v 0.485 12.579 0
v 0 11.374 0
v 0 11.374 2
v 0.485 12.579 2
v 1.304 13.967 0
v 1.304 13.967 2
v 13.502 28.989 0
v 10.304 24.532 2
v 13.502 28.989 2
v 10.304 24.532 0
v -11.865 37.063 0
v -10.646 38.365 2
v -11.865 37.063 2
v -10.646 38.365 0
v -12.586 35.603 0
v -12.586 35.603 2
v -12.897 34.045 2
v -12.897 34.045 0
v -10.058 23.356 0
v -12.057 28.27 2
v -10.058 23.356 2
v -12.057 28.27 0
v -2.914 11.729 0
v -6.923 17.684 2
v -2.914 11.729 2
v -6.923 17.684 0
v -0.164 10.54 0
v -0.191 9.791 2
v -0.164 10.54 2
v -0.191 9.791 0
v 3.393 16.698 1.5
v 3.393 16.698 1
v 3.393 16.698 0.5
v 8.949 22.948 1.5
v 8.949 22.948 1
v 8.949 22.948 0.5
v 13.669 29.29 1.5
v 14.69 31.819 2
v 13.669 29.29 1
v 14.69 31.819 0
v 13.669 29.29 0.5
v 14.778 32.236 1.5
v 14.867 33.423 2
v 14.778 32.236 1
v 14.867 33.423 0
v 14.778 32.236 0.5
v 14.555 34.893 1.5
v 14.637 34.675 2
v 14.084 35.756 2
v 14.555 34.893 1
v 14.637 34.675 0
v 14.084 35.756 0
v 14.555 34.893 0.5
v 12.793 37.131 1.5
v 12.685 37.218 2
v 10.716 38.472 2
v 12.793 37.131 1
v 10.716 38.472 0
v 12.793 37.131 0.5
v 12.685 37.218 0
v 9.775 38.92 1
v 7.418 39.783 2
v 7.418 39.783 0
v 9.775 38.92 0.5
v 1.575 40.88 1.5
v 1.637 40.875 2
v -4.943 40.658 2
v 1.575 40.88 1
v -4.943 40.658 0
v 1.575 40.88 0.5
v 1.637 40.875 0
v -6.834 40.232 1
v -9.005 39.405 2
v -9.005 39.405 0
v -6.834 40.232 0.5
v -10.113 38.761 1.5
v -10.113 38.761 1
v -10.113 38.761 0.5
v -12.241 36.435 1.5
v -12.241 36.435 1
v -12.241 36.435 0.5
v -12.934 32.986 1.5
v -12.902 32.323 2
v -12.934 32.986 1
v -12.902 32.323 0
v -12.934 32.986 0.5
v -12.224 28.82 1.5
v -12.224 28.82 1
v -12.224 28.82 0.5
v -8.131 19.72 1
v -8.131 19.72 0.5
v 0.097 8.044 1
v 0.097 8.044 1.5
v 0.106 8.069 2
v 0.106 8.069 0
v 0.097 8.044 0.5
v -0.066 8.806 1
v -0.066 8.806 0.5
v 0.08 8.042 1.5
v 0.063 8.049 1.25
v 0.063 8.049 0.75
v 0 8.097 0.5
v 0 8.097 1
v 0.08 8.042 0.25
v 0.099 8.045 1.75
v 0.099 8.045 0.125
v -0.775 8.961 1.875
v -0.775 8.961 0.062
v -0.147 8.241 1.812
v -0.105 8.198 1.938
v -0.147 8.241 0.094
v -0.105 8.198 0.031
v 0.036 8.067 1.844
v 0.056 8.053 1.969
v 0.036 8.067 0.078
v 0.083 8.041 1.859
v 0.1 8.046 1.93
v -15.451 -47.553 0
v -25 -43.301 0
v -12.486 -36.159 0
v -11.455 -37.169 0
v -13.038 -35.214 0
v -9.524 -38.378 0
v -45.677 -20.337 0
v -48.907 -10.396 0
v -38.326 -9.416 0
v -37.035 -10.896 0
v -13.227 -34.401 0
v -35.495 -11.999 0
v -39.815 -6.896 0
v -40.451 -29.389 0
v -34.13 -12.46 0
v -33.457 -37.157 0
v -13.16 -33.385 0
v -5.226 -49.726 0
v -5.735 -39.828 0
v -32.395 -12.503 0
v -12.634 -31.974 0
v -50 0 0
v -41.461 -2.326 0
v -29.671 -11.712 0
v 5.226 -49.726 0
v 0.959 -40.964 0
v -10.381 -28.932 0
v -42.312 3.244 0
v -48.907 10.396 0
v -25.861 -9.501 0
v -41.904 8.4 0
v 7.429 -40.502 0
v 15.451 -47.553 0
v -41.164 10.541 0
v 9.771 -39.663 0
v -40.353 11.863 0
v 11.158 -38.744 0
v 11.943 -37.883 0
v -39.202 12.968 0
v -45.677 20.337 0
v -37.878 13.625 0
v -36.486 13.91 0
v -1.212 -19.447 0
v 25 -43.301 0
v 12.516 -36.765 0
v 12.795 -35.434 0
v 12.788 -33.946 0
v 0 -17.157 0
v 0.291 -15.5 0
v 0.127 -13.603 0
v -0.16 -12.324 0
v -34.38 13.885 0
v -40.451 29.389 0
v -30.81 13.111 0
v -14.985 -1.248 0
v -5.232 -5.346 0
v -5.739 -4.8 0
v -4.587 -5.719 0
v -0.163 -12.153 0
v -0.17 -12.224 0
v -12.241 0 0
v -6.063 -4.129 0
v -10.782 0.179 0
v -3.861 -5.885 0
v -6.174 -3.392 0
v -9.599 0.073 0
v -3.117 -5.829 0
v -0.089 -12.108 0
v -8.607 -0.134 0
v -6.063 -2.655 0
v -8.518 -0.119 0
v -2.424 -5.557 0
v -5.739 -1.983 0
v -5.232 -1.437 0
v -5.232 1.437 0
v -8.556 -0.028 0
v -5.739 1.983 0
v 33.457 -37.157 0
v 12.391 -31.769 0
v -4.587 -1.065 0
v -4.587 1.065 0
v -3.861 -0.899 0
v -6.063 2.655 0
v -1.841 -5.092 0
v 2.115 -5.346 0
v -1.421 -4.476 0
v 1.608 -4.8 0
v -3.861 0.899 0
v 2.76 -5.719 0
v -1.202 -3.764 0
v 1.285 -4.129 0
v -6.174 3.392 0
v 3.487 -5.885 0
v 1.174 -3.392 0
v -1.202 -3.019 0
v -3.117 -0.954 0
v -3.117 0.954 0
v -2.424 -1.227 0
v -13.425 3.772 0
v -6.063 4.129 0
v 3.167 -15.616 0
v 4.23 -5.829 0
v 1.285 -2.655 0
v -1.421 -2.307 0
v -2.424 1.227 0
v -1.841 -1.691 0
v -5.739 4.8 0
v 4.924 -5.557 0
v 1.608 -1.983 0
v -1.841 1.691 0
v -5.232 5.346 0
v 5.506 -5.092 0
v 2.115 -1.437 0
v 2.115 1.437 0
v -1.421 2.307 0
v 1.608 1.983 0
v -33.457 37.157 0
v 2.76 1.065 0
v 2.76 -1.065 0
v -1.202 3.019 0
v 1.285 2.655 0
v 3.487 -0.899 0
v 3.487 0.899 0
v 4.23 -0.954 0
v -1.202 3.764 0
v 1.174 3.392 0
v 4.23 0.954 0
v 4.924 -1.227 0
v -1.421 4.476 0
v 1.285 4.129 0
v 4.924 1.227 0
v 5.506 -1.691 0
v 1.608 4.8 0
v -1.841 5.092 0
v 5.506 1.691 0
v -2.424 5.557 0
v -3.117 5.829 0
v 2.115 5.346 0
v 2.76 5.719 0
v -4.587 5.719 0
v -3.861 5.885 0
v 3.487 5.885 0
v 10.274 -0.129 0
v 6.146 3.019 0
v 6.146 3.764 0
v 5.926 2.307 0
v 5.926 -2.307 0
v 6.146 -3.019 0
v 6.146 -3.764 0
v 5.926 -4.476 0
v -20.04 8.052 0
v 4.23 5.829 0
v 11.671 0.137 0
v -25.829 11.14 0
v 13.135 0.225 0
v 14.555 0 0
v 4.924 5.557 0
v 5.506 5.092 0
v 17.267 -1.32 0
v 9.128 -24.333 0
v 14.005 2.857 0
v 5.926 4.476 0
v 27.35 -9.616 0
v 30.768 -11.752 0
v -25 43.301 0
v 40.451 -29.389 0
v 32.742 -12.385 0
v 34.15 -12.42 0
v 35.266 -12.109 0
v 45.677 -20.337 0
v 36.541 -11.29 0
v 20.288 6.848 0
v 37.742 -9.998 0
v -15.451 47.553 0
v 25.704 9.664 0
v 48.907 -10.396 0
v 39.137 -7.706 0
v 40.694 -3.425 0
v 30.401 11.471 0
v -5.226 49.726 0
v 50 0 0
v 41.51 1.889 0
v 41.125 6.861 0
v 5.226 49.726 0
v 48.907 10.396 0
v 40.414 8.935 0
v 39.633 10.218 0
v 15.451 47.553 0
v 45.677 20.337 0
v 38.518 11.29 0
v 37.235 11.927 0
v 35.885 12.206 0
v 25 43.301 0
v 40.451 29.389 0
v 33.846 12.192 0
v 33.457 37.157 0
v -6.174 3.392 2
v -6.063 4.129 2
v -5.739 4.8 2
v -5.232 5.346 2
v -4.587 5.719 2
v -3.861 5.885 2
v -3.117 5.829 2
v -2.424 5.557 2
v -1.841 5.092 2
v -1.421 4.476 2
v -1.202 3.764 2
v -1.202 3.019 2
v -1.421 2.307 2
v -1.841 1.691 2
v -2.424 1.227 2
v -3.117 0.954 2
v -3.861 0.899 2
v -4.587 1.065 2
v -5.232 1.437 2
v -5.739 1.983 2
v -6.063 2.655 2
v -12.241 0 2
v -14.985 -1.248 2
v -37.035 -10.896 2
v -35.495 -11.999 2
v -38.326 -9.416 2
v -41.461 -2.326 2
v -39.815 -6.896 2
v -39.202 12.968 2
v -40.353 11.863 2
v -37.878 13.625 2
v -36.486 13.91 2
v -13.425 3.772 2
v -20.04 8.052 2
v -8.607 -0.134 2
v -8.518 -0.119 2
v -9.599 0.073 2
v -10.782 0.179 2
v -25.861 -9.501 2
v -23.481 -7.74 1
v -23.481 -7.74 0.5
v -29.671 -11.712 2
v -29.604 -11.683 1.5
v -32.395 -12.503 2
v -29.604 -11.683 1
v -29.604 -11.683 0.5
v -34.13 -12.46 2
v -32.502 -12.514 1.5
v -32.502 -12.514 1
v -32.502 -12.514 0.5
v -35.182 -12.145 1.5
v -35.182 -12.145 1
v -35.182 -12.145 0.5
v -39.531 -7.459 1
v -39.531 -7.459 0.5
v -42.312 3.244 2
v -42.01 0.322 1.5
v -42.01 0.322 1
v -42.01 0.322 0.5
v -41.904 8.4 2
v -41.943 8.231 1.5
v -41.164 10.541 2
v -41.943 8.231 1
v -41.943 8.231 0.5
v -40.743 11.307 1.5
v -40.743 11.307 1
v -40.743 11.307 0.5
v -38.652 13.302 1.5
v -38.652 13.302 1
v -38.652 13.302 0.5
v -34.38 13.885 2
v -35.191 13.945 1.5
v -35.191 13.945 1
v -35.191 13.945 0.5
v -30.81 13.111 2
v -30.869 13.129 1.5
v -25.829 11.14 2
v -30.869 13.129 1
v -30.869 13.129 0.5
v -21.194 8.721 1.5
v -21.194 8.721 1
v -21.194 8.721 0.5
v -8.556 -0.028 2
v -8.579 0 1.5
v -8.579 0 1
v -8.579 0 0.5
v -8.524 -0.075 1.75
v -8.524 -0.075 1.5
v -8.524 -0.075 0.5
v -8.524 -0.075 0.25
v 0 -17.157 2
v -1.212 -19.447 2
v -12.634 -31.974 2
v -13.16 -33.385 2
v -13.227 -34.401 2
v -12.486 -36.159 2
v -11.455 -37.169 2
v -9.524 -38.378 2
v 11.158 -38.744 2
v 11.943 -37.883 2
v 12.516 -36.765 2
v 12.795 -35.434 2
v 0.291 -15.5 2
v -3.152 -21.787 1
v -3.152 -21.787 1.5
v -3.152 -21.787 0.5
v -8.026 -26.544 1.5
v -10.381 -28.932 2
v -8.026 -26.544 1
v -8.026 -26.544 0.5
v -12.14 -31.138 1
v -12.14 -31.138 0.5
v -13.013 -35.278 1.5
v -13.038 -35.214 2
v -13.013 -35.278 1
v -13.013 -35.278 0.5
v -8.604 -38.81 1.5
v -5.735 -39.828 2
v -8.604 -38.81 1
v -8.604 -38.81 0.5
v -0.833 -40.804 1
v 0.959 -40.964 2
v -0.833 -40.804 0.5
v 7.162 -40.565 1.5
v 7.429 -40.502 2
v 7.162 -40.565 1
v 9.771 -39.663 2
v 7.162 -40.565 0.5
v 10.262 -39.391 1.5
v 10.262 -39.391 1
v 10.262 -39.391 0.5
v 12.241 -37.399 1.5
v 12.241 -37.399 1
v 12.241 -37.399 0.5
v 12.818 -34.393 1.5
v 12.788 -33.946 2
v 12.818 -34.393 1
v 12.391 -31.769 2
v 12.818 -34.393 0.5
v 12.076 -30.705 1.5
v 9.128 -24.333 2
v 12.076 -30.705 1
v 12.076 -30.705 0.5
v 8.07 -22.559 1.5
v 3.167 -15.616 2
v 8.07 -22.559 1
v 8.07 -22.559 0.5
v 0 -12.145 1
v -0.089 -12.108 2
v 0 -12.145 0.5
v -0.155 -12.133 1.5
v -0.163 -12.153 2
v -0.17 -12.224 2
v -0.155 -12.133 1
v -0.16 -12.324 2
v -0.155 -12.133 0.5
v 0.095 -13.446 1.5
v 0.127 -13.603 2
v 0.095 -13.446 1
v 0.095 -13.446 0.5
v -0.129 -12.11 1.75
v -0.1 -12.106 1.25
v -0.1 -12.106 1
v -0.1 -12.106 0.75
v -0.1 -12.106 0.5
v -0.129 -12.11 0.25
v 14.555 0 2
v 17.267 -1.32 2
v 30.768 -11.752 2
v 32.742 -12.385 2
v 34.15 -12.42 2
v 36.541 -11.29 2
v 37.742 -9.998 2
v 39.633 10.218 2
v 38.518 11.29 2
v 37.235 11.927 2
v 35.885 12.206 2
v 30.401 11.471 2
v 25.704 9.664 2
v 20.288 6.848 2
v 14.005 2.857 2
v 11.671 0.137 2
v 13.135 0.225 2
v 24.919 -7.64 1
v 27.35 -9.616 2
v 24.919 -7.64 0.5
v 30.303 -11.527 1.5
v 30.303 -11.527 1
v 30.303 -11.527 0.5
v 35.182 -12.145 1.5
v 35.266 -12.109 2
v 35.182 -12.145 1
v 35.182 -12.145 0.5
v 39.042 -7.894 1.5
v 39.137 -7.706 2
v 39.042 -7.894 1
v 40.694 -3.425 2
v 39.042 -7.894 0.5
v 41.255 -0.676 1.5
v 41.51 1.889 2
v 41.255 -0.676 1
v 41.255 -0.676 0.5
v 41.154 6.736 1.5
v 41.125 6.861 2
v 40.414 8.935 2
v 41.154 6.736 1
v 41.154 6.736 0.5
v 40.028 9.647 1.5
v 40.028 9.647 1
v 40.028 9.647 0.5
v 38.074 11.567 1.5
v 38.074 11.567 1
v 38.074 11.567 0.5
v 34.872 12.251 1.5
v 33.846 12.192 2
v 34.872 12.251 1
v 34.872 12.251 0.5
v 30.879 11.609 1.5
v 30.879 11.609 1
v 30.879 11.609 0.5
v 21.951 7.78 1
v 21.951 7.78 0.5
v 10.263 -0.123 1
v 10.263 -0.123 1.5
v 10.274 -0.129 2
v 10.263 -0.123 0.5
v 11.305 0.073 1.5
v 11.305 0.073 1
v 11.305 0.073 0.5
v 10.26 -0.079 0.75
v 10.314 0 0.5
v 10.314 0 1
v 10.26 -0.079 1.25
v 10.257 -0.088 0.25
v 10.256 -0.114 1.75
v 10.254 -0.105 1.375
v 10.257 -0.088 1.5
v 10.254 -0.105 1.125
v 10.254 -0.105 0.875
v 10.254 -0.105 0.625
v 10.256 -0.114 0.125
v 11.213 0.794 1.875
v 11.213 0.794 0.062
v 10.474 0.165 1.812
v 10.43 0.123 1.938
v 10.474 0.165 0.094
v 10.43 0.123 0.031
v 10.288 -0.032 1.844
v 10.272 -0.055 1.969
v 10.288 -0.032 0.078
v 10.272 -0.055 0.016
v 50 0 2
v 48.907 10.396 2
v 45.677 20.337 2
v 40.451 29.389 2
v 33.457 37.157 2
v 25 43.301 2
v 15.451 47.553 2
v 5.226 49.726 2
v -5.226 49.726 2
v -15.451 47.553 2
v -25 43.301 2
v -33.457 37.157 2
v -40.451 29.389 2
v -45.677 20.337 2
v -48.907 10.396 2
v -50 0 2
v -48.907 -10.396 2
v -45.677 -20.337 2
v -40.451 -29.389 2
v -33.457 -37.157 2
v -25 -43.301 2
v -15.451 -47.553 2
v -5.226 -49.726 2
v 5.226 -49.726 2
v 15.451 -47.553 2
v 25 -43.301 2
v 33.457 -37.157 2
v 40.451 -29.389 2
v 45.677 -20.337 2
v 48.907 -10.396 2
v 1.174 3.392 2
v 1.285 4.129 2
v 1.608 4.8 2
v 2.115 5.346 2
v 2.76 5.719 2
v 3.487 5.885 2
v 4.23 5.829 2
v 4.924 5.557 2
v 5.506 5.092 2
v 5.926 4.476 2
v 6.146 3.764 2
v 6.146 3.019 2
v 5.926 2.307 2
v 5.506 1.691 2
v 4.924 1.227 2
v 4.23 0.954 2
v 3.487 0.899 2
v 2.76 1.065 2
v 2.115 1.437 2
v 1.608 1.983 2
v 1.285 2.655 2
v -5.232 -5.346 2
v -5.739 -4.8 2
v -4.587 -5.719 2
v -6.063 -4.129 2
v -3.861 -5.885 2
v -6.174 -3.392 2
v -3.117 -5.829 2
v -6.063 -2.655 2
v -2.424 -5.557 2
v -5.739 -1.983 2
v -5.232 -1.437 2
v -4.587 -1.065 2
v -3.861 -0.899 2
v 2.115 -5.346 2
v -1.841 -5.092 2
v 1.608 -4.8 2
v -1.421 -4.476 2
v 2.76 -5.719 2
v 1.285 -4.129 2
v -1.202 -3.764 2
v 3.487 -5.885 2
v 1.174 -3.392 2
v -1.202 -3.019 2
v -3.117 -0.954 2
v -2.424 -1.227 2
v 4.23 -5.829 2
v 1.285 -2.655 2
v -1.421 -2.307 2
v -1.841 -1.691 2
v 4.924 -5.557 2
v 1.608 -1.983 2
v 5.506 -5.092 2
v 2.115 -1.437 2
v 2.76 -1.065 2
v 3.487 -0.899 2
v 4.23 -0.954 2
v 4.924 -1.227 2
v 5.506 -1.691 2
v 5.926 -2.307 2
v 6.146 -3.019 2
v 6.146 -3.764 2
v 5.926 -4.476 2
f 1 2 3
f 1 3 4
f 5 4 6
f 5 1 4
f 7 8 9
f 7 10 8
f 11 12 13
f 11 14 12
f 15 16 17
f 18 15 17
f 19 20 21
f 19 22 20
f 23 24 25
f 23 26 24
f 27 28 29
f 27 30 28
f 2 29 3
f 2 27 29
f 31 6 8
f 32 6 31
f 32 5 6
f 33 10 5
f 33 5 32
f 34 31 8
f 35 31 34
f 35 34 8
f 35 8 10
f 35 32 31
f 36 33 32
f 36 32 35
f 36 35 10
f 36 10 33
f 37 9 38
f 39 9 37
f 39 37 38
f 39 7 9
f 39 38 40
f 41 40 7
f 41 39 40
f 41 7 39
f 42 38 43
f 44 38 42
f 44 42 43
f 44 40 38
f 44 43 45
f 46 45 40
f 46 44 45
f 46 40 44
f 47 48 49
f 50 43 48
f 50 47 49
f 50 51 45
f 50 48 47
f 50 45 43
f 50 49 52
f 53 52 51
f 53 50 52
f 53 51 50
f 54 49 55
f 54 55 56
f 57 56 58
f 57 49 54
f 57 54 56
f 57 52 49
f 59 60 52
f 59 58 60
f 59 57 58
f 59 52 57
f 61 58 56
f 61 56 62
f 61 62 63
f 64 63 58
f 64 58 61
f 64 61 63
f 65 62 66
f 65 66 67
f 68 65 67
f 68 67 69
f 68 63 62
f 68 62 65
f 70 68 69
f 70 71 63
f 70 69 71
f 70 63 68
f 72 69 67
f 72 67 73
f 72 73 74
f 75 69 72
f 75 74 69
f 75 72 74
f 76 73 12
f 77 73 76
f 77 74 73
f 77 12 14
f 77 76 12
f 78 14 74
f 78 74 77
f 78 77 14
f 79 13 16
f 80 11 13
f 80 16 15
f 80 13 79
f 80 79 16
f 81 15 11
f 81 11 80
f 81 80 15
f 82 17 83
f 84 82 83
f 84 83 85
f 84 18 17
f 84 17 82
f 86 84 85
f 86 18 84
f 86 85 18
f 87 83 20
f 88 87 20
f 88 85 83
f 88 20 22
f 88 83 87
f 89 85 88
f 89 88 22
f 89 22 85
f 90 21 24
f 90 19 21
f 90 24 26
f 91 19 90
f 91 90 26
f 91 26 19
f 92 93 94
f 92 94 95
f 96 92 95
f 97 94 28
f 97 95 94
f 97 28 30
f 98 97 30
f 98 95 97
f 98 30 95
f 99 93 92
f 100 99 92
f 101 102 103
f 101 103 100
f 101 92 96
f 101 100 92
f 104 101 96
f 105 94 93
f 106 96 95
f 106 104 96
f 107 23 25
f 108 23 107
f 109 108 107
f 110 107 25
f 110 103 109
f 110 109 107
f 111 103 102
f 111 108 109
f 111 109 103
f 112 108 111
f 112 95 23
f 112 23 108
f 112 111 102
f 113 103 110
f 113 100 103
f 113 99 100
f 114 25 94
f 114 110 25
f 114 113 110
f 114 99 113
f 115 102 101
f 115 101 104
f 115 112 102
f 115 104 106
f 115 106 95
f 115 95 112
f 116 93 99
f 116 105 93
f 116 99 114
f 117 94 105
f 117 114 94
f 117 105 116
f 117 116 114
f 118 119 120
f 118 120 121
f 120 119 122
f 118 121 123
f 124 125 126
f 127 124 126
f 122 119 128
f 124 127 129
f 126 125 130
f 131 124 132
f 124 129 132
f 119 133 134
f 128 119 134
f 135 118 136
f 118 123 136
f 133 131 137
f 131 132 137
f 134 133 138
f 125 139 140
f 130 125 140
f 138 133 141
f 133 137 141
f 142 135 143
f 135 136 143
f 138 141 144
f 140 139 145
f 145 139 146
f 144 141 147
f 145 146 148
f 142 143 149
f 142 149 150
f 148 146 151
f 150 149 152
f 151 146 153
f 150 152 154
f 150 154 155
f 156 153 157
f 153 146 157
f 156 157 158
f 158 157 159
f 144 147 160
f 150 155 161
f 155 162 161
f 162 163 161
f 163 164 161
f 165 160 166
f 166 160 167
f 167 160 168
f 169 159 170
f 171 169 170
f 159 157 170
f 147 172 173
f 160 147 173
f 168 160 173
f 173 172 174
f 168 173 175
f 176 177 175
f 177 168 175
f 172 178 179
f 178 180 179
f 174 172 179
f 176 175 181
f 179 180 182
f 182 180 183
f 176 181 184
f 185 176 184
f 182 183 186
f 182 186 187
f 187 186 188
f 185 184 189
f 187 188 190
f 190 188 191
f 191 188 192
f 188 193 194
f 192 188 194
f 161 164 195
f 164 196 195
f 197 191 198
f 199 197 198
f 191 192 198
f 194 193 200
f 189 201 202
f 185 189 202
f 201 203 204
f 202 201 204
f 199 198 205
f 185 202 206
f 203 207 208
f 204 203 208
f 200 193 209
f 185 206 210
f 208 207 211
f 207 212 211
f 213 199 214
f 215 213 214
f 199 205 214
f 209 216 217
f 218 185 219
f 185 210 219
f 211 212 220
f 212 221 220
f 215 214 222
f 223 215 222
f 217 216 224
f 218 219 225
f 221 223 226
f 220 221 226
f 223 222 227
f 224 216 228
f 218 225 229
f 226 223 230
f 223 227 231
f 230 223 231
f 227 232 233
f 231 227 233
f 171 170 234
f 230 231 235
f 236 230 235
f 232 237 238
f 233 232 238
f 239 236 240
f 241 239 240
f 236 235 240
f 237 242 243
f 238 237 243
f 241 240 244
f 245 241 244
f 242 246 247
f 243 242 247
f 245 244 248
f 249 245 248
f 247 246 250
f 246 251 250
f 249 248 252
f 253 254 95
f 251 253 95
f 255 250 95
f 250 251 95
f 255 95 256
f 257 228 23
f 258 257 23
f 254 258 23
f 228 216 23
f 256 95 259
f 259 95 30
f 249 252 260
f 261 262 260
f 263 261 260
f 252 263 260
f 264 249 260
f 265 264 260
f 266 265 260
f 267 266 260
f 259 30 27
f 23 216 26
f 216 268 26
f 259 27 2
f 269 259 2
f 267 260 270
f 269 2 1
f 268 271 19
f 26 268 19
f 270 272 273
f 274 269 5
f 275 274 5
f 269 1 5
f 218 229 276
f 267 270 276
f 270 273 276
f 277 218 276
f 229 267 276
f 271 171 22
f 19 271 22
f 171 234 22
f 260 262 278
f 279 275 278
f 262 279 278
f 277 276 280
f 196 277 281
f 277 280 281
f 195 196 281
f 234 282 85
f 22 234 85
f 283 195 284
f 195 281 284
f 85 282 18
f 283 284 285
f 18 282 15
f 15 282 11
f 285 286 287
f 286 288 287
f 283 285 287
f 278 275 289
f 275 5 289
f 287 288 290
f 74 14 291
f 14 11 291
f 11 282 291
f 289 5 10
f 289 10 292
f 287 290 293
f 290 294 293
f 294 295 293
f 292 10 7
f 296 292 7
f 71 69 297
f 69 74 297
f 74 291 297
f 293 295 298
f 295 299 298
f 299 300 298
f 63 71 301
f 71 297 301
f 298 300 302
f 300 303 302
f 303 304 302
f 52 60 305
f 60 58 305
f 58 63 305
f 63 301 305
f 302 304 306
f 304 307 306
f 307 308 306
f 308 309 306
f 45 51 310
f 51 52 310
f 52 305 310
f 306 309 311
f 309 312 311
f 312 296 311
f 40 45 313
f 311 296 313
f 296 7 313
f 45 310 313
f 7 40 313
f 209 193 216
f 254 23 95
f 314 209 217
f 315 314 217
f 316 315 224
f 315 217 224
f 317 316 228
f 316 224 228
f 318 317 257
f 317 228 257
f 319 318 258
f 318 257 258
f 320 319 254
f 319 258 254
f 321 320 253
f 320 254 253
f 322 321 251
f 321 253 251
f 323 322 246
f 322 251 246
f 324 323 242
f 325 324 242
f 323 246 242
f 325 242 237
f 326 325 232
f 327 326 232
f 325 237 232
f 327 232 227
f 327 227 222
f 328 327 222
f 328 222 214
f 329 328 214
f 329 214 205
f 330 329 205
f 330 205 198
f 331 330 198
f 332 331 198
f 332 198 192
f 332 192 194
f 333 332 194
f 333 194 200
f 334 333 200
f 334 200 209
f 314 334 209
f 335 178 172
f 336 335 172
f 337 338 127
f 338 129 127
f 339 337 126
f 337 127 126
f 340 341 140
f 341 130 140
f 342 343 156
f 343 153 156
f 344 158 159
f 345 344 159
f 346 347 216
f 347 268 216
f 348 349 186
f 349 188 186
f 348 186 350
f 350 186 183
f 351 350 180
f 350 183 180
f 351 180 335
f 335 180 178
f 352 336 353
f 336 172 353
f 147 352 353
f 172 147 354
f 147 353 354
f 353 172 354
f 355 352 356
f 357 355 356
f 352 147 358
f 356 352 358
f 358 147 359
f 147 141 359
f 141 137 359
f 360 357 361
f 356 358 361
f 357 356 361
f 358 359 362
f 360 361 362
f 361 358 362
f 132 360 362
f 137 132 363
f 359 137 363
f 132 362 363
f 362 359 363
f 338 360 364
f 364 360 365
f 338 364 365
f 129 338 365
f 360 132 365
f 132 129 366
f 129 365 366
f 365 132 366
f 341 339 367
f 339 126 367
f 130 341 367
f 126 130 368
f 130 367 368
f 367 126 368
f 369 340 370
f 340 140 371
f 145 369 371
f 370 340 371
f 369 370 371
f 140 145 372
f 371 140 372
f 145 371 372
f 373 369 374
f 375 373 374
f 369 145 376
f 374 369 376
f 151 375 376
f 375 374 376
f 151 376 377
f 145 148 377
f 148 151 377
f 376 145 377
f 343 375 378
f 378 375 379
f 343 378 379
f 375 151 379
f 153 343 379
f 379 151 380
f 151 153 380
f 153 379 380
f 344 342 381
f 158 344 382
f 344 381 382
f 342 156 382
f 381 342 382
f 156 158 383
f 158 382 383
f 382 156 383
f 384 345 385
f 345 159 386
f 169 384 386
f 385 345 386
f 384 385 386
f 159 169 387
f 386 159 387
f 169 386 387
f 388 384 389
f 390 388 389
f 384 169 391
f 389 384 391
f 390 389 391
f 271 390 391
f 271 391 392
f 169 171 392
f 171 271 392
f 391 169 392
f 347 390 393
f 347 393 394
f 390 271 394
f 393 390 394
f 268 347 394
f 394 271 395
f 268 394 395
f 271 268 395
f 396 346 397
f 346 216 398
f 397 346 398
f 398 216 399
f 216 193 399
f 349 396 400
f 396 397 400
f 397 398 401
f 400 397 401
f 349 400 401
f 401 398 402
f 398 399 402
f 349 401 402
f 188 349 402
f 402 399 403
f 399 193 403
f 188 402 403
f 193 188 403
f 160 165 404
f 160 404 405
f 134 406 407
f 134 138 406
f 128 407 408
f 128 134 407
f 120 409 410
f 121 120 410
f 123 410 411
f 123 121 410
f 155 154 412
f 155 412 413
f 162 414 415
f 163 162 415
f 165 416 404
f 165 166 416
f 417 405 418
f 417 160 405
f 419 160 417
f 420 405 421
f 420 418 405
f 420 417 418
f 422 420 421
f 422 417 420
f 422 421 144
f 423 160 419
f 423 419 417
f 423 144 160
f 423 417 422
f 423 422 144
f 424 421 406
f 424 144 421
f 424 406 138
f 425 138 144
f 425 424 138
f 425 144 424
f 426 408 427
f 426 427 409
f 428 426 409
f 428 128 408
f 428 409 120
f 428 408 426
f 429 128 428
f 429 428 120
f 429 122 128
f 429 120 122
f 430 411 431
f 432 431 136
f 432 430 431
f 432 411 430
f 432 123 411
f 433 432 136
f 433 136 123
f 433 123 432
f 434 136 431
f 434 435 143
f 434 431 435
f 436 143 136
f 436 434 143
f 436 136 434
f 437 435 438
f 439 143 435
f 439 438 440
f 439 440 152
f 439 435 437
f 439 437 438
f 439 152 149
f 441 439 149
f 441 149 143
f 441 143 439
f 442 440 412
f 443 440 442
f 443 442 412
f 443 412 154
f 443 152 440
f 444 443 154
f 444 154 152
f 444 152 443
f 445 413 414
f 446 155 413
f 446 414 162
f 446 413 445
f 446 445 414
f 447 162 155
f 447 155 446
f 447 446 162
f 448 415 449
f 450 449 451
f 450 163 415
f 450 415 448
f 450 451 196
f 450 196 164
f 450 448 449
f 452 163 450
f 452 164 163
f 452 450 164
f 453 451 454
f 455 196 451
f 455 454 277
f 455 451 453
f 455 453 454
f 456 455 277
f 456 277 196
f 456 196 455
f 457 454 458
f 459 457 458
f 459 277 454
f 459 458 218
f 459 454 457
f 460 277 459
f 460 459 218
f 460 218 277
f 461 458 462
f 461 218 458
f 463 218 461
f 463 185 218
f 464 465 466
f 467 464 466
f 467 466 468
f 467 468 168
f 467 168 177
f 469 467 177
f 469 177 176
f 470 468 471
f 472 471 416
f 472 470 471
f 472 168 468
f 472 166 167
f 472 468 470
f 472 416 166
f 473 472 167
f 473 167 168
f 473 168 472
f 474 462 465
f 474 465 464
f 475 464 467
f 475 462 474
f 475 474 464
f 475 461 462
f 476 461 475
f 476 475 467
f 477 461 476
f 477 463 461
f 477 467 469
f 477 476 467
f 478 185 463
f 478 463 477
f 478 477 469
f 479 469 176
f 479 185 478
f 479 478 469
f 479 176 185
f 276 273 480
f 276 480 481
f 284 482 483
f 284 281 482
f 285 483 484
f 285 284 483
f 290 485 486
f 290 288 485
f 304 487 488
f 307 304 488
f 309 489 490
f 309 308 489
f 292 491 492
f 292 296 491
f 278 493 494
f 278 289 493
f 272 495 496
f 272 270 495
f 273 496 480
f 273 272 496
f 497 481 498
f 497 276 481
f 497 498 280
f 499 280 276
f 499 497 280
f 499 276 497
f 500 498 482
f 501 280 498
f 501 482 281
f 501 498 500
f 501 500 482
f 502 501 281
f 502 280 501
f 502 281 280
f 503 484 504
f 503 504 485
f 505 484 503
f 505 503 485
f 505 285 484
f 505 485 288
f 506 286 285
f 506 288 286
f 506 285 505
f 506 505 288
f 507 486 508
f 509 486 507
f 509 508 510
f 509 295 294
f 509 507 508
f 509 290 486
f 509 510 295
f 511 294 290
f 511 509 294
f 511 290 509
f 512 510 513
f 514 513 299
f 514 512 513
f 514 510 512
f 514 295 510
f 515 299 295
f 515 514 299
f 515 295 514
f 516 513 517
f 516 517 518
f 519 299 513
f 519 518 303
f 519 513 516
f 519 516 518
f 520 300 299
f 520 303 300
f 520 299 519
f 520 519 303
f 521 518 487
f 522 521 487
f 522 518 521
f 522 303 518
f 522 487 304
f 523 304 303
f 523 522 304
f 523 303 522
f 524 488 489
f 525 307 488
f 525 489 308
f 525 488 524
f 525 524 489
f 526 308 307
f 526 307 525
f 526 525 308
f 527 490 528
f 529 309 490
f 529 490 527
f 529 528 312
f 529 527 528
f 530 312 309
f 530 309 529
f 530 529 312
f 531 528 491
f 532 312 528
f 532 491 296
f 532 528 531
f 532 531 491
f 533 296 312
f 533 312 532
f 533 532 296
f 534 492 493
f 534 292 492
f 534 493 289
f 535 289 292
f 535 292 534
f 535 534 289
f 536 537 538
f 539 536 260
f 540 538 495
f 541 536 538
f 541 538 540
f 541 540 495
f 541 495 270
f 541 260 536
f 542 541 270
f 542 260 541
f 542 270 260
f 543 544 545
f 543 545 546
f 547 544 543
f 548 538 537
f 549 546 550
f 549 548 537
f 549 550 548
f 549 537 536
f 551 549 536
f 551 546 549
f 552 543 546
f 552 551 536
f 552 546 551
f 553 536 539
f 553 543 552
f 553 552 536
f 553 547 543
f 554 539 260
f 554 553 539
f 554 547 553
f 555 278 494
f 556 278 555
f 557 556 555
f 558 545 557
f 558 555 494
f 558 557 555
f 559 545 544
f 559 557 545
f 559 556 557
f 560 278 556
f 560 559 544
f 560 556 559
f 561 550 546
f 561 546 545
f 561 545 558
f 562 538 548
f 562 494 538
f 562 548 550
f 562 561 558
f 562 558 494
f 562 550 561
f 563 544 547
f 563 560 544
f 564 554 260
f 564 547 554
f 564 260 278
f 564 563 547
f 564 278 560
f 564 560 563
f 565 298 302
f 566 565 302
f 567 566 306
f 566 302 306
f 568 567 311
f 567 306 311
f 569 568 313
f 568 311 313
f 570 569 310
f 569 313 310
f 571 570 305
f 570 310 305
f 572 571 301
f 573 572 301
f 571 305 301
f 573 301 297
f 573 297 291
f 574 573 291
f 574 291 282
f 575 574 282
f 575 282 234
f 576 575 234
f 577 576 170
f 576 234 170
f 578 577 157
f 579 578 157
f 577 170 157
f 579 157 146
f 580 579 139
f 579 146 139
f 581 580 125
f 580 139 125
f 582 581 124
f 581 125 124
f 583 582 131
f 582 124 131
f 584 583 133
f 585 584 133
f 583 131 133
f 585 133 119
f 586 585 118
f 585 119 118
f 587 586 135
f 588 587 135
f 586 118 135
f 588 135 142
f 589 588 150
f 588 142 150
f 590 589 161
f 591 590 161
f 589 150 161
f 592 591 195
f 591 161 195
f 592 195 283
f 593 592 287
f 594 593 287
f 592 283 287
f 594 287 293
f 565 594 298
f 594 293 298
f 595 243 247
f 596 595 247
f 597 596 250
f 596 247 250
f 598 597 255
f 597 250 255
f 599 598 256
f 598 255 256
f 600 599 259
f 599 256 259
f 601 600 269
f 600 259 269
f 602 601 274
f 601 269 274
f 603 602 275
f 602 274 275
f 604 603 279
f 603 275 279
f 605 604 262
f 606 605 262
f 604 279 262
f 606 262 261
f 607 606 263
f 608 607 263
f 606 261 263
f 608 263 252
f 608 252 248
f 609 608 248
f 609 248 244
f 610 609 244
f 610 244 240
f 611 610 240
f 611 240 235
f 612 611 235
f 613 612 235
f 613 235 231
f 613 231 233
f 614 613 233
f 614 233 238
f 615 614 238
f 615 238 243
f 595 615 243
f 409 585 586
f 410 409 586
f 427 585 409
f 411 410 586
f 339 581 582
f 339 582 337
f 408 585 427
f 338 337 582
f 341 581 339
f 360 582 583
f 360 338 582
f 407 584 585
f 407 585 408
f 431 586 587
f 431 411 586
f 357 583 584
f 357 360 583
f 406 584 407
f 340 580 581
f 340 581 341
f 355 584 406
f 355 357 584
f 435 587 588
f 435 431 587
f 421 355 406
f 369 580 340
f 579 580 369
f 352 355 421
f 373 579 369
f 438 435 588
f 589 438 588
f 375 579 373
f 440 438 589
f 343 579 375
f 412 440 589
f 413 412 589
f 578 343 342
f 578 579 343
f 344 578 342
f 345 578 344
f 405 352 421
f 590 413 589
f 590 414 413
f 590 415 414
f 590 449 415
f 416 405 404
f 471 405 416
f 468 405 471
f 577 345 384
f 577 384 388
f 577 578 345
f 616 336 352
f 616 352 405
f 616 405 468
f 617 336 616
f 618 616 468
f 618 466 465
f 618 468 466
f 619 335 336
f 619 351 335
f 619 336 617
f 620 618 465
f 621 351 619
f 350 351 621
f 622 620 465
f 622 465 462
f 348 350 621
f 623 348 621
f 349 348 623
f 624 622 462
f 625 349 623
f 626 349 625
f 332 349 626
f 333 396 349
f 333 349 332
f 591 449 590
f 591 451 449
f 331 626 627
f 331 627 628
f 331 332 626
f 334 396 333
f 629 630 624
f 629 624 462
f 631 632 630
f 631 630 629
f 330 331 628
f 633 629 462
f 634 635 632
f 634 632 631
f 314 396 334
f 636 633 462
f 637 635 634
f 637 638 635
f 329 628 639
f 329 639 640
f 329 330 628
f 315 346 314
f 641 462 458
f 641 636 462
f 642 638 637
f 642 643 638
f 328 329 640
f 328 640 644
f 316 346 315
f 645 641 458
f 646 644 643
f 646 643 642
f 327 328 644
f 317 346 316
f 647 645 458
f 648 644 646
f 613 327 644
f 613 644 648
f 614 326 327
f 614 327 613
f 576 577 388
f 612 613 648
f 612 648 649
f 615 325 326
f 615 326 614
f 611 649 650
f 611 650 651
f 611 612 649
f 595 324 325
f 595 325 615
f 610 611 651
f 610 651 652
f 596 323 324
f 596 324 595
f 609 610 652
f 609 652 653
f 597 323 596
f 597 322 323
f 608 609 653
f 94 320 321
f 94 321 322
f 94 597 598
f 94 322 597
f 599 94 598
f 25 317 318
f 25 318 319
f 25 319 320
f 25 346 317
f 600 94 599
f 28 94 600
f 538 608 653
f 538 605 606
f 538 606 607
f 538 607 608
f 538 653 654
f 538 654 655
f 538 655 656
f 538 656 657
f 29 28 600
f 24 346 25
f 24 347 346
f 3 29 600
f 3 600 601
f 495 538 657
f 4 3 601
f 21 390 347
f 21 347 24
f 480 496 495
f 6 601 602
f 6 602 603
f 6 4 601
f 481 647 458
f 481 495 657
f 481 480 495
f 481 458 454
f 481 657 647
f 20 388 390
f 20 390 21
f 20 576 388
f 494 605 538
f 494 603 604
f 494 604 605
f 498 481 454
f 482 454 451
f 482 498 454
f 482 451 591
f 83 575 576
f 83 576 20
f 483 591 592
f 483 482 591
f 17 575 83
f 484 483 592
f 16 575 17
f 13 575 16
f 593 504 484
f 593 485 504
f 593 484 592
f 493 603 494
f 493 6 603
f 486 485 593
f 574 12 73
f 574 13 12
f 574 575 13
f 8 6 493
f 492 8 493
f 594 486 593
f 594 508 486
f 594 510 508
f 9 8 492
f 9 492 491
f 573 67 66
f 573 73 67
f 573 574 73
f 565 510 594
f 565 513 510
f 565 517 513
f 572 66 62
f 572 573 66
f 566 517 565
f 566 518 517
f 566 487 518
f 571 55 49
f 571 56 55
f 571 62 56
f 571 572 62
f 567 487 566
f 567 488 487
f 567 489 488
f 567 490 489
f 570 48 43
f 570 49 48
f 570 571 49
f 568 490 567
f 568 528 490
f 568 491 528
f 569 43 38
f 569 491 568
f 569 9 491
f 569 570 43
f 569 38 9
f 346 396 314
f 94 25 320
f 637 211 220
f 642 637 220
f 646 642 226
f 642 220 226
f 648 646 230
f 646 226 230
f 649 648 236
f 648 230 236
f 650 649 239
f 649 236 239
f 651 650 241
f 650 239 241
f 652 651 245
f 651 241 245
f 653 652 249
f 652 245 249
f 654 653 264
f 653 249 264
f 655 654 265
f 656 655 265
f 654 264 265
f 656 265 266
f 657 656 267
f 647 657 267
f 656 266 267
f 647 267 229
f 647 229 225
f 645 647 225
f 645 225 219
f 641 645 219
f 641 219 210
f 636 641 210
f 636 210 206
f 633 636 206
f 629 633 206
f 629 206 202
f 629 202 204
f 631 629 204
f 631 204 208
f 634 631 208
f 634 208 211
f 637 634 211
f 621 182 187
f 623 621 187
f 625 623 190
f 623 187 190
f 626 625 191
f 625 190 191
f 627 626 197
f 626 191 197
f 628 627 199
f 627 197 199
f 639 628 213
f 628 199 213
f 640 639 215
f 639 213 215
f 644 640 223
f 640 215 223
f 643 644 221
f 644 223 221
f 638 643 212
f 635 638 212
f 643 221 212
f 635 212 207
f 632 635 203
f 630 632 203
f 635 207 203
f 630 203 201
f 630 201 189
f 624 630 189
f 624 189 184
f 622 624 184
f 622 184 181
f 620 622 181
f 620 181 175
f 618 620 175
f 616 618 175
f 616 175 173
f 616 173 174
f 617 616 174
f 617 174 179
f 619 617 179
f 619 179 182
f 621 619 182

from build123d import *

# Parameters (mm, degrees)
F0_R     = 50
F1_DEPTH = 2
F3_D     = 5
F5_DEPTH = 2
F6_DEPTH = 2


with BuildPart() as f1:
    # F0 (on Top) → F1 (new body)
    with BuildSketch(Plane.XY):
        Circle(F0_R)
    extrude(amount=F1_DEPTH)

    # F3 (through all)
    with Locations(Plane.XY.offset(2)):
        with Locations((3.6737150516, -3.3917278369), (3.6737150516, 3.3917278369), (-3.6737150516, 3.3917278369), (-3.6737150516, -3.3917278369)):
            Hole(F3_D / 2)

    # F4 (on face) → F5 (cut)
    with BuildSketch(Plane(origin=(0, 0, 0), x_dir=(1, 0, 0), z_dir=(0, 0, -1))):
        with BuildLine():
            add(Edge.make_bspline(
                [(-12.2414324433, 0), (-18.4056373658, 1.5650833739), (-38.3443477555, 28.4144518094), (-49.5218394848, -31.2899076627), (-2.8329855538, 3.7705432238), (-9.9258810126, -0.5879154069), (-12.2414324433, 0)],
                knots=[0, 0, 0, 0, 0.2860510544, 0.5705832769, 0.8925464133, 1, 1, 1, 1], degree=3))
        make_face()
    extrude(amount=-F5_DEPTH, mode=Mode.SUBTRACT)

    # F4 (on face) → F6 (cut)
    with BuildSketch(Plane(origin=(0, 0, 0), x_dir=(1, 0, 0), z_dir=(0, 0, -1))):
        with BuildLine():
            add(Edge.make_bspline(
                [(0, 17.1572826803), (-1.9504478032, 23.1173887703), (-29.1441676817, 37.7239940538), (29.4134081036, 47.2225176343), (-4.4439160706, 5.6622095776), (0.9245014358, 14.3322254659), (0, 17.1572826803)],
                knots=[0, 0, 0, 0, 0.273118645, 0.5642148024, 0.8705432778, 1, 1, 1, 1], degree=3))
        make_face()
        with BuildLine():
            add(Edge.make_bspline(
                [(14.554772526, 0), (20.6461698694, 1.7197331533), (37.7975195879, 27.4751700415), (48.199428819, -28.0162444096), (4.2142088502, 3.8702916762), (11.9907542208, -0.7238777963), (14.554772526, 0)],
                knots=[0, 0, 0, 0, 0.2824256264, 0.5645577012, 0.8811201379, 1, 1, 1, 1], degree=3))
        make_face()
        with BuildLine():
            add(Edge.make_bspline(
                [(0, -11.3739296794), (1.7506338442, -17.4850699026), (32.5421339999, -38.9276133094), (-30.2787687975, -46.4494204681), (3.5799595659, -2.9721319816), (-0.6026095679, -9.2703306993), (0, -11.3739296794)],
                knots=[0, 0, 0, 0, 0.2953525562, 0.5863059459, 0.8983326657, 1, 1, 1, 1], degree=3))
        make_face()
    extrude(amount=-F6_DEPTH, mode=Mode.SUBTRACT)


solid = f1.part
